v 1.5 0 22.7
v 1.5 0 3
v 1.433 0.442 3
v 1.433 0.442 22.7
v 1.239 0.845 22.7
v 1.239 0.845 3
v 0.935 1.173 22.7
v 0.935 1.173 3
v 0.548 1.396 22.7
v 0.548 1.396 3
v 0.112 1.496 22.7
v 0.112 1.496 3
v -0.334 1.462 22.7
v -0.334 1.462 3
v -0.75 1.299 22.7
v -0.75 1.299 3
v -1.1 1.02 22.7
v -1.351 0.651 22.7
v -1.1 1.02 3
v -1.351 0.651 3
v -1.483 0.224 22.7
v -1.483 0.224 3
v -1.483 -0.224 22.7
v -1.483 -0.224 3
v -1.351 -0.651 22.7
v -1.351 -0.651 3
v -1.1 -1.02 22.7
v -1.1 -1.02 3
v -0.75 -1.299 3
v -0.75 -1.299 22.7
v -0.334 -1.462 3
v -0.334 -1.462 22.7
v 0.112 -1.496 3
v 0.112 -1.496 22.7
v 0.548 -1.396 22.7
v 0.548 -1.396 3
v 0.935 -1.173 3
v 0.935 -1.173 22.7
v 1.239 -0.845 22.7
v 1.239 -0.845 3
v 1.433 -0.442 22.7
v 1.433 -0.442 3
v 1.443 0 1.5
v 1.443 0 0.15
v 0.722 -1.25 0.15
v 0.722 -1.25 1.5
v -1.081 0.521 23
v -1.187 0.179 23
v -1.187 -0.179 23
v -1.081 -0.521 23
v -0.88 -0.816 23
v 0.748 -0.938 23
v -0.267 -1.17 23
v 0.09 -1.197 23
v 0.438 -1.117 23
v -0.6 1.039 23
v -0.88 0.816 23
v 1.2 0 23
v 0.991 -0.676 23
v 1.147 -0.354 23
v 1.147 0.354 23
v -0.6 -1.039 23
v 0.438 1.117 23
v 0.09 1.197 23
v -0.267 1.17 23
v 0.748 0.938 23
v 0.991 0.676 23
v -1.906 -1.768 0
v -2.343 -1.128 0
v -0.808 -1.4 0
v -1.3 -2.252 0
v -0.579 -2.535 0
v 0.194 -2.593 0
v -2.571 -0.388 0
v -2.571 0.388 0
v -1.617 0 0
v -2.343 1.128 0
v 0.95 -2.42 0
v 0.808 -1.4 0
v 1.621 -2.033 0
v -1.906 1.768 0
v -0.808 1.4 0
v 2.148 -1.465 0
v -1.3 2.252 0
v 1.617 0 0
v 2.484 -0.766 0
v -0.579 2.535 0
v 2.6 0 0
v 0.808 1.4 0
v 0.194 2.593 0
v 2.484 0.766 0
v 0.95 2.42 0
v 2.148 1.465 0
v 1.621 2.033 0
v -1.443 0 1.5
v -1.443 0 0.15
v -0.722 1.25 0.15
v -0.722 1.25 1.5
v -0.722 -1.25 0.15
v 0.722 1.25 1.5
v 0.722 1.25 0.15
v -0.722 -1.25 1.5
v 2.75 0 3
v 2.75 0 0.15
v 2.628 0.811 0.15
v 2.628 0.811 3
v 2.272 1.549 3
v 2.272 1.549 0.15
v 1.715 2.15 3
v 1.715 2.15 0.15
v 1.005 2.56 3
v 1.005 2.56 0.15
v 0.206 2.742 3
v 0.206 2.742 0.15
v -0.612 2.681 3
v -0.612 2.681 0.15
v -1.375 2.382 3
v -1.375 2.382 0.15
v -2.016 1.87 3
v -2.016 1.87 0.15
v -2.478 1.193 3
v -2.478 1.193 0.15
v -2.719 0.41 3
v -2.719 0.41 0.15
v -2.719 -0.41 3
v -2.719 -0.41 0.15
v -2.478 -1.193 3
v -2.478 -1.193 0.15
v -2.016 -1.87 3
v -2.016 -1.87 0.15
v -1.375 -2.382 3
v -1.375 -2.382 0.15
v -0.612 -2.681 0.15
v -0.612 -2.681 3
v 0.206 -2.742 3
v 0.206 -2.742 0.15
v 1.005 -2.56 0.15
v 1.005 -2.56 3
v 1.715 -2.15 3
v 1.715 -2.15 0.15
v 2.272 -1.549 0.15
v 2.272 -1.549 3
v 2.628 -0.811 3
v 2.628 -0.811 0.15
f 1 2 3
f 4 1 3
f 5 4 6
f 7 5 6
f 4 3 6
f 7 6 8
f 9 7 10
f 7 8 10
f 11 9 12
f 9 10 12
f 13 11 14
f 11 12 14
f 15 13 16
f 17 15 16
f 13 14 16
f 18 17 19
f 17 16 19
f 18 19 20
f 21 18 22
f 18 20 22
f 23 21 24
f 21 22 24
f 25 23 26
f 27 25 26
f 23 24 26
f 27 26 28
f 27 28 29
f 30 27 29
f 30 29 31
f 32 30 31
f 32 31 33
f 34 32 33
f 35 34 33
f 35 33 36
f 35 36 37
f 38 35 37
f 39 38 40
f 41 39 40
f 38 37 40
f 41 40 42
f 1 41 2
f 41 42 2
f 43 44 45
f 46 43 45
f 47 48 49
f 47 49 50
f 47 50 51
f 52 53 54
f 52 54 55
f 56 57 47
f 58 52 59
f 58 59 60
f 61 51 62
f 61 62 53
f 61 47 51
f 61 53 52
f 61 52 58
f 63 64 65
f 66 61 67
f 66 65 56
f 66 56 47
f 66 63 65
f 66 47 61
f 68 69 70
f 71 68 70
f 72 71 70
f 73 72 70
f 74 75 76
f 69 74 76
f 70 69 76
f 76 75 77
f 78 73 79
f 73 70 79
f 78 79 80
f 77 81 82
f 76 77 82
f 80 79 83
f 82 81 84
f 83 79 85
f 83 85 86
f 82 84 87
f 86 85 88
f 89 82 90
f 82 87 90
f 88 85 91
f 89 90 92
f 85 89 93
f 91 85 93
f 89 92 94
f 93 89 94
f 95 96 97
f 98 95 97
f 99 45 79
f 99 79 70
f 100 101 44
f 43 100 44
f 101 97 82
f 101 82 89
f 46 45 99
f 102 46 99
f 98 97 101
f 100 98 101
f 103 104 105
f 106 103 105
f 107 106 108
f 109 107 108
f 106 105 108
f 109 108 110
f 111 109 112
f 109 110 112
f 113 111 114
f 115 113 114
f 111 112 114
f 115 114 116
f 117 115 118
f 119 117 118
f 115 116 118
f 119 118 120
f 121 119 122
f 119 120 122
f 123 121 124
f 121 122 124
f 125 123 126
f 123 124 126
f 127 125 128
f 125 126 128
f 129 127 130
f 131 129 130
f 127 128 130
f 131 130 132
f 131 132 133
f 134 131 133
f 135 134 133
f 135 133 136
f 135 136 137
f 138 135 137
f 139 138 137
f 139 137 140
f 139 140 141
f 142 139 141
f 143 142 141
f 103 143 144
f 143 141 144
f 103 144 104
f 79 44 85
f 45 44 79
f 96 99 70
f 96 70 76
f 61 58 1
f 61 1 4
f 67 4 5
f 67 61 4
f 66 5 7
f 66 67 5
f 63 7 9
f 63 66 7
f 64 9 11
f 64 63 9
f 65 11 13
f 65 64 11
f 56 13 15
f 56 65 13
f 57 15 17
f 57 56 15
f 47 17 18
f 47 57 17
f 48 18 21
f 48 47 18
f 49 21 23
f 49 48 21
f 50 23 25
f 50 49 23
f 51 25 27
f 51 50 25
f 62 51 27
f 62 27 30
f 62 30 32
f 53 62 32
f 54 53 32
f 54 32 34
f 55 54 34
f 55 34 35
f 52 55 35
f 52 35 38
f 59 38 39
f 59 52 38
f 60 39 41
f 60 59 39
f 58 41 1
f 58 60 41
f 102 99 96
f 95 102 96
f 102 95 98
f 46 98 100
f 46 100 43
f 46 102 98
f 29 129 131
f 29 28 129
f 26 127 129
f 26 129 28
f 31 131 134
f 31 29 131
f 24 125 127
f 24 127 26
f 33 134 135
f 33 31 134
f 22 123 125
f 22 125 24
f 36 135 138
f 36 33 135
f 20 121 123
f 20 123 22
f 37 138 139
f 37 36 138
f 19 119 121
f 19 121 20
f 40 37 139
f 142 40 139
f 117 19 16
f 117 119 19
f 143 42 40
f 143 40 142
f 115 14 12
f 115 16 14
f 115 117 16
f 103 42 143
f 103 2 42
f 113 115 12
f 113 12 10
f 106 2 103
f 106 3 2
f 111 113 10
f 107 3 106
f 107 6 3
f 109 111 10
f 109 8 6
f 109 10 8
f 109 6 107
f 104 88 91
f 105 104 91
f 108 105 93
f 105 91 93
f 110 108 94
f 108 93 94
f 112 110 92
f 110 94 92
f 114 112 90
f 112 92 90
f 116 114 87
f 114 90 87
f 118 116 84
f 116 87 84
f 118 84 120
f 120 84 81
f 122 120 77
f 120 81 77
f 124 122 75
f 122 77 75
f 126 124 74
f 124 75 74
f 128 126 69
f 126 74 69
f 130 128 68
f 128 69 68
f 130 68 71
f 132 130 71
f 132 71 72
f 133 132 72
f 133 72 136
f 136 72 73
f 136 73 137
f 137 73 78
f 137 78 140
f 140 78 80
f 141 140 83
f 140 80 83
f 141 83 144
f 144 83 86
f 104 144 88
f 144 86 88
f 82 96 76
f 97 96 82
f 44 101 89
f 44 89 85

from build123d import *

# Parameters (mm, degrees)
F3_R     = 2.75
F4_DEPTH = 3
F6_DEPTH = 1.5
F7_R     = 1.5
F8_DEPTH = 20
F9_SIZE  = 0.15
F10_SIZE = 0.3


with BuildPart() as f4:
    # F3 (on Top) → F4 (new body)
    with BuildSketch(Plane.XY):
        Circle(F3_R)
    extrude(amount=F4_DEPTH)

    # F5 (on face) → F6 (cut)
    with BuildSketch(Plane(origin=(0, 0, 0), x_dir=(1, 0, 0), z_dir=(0, 0, -1))):
        Polygon((0.7216878365, 1.25), (-0.7216878365, 1.25), (-1.443375673, 0), (-0.7216878365, -1.25), (0.7216878365, -1.25), (1.443375673, 0), align=None)
    extrude(amount=-F6_DEPTH, mode=Mode.SUBTRACT)

    # F7 (on face) → F8 (join)
    with BuildSketch(Plane.XY.offset(3)):
        Circle(F7_R)
    extrude(amount=F8_DEPTH)

    # F9
    f9_edges = [f4.edges().sort_by_distance(p)[0] for p in [
        (-2.75, 0, 0),
        (0, -1.25, 0),
        (1.082532, -0.625, 0),
        (1.082532, 0.625, 0),
        (0, 1.25, 0),
        (-1.082532, -0.625, 0),
        (-1.082532, 0.625, 0),
    ]]
    chamfer(f9_edges, length=F9_SIZE)

    # F10
    f10_edges = [f4.edges().sort_by_distance(p)[0] for p in [
        (-1.5, 0, 23),
    ]]
    chamfer(f10_edges, length=F10_SIZE)


solid = f4.part
